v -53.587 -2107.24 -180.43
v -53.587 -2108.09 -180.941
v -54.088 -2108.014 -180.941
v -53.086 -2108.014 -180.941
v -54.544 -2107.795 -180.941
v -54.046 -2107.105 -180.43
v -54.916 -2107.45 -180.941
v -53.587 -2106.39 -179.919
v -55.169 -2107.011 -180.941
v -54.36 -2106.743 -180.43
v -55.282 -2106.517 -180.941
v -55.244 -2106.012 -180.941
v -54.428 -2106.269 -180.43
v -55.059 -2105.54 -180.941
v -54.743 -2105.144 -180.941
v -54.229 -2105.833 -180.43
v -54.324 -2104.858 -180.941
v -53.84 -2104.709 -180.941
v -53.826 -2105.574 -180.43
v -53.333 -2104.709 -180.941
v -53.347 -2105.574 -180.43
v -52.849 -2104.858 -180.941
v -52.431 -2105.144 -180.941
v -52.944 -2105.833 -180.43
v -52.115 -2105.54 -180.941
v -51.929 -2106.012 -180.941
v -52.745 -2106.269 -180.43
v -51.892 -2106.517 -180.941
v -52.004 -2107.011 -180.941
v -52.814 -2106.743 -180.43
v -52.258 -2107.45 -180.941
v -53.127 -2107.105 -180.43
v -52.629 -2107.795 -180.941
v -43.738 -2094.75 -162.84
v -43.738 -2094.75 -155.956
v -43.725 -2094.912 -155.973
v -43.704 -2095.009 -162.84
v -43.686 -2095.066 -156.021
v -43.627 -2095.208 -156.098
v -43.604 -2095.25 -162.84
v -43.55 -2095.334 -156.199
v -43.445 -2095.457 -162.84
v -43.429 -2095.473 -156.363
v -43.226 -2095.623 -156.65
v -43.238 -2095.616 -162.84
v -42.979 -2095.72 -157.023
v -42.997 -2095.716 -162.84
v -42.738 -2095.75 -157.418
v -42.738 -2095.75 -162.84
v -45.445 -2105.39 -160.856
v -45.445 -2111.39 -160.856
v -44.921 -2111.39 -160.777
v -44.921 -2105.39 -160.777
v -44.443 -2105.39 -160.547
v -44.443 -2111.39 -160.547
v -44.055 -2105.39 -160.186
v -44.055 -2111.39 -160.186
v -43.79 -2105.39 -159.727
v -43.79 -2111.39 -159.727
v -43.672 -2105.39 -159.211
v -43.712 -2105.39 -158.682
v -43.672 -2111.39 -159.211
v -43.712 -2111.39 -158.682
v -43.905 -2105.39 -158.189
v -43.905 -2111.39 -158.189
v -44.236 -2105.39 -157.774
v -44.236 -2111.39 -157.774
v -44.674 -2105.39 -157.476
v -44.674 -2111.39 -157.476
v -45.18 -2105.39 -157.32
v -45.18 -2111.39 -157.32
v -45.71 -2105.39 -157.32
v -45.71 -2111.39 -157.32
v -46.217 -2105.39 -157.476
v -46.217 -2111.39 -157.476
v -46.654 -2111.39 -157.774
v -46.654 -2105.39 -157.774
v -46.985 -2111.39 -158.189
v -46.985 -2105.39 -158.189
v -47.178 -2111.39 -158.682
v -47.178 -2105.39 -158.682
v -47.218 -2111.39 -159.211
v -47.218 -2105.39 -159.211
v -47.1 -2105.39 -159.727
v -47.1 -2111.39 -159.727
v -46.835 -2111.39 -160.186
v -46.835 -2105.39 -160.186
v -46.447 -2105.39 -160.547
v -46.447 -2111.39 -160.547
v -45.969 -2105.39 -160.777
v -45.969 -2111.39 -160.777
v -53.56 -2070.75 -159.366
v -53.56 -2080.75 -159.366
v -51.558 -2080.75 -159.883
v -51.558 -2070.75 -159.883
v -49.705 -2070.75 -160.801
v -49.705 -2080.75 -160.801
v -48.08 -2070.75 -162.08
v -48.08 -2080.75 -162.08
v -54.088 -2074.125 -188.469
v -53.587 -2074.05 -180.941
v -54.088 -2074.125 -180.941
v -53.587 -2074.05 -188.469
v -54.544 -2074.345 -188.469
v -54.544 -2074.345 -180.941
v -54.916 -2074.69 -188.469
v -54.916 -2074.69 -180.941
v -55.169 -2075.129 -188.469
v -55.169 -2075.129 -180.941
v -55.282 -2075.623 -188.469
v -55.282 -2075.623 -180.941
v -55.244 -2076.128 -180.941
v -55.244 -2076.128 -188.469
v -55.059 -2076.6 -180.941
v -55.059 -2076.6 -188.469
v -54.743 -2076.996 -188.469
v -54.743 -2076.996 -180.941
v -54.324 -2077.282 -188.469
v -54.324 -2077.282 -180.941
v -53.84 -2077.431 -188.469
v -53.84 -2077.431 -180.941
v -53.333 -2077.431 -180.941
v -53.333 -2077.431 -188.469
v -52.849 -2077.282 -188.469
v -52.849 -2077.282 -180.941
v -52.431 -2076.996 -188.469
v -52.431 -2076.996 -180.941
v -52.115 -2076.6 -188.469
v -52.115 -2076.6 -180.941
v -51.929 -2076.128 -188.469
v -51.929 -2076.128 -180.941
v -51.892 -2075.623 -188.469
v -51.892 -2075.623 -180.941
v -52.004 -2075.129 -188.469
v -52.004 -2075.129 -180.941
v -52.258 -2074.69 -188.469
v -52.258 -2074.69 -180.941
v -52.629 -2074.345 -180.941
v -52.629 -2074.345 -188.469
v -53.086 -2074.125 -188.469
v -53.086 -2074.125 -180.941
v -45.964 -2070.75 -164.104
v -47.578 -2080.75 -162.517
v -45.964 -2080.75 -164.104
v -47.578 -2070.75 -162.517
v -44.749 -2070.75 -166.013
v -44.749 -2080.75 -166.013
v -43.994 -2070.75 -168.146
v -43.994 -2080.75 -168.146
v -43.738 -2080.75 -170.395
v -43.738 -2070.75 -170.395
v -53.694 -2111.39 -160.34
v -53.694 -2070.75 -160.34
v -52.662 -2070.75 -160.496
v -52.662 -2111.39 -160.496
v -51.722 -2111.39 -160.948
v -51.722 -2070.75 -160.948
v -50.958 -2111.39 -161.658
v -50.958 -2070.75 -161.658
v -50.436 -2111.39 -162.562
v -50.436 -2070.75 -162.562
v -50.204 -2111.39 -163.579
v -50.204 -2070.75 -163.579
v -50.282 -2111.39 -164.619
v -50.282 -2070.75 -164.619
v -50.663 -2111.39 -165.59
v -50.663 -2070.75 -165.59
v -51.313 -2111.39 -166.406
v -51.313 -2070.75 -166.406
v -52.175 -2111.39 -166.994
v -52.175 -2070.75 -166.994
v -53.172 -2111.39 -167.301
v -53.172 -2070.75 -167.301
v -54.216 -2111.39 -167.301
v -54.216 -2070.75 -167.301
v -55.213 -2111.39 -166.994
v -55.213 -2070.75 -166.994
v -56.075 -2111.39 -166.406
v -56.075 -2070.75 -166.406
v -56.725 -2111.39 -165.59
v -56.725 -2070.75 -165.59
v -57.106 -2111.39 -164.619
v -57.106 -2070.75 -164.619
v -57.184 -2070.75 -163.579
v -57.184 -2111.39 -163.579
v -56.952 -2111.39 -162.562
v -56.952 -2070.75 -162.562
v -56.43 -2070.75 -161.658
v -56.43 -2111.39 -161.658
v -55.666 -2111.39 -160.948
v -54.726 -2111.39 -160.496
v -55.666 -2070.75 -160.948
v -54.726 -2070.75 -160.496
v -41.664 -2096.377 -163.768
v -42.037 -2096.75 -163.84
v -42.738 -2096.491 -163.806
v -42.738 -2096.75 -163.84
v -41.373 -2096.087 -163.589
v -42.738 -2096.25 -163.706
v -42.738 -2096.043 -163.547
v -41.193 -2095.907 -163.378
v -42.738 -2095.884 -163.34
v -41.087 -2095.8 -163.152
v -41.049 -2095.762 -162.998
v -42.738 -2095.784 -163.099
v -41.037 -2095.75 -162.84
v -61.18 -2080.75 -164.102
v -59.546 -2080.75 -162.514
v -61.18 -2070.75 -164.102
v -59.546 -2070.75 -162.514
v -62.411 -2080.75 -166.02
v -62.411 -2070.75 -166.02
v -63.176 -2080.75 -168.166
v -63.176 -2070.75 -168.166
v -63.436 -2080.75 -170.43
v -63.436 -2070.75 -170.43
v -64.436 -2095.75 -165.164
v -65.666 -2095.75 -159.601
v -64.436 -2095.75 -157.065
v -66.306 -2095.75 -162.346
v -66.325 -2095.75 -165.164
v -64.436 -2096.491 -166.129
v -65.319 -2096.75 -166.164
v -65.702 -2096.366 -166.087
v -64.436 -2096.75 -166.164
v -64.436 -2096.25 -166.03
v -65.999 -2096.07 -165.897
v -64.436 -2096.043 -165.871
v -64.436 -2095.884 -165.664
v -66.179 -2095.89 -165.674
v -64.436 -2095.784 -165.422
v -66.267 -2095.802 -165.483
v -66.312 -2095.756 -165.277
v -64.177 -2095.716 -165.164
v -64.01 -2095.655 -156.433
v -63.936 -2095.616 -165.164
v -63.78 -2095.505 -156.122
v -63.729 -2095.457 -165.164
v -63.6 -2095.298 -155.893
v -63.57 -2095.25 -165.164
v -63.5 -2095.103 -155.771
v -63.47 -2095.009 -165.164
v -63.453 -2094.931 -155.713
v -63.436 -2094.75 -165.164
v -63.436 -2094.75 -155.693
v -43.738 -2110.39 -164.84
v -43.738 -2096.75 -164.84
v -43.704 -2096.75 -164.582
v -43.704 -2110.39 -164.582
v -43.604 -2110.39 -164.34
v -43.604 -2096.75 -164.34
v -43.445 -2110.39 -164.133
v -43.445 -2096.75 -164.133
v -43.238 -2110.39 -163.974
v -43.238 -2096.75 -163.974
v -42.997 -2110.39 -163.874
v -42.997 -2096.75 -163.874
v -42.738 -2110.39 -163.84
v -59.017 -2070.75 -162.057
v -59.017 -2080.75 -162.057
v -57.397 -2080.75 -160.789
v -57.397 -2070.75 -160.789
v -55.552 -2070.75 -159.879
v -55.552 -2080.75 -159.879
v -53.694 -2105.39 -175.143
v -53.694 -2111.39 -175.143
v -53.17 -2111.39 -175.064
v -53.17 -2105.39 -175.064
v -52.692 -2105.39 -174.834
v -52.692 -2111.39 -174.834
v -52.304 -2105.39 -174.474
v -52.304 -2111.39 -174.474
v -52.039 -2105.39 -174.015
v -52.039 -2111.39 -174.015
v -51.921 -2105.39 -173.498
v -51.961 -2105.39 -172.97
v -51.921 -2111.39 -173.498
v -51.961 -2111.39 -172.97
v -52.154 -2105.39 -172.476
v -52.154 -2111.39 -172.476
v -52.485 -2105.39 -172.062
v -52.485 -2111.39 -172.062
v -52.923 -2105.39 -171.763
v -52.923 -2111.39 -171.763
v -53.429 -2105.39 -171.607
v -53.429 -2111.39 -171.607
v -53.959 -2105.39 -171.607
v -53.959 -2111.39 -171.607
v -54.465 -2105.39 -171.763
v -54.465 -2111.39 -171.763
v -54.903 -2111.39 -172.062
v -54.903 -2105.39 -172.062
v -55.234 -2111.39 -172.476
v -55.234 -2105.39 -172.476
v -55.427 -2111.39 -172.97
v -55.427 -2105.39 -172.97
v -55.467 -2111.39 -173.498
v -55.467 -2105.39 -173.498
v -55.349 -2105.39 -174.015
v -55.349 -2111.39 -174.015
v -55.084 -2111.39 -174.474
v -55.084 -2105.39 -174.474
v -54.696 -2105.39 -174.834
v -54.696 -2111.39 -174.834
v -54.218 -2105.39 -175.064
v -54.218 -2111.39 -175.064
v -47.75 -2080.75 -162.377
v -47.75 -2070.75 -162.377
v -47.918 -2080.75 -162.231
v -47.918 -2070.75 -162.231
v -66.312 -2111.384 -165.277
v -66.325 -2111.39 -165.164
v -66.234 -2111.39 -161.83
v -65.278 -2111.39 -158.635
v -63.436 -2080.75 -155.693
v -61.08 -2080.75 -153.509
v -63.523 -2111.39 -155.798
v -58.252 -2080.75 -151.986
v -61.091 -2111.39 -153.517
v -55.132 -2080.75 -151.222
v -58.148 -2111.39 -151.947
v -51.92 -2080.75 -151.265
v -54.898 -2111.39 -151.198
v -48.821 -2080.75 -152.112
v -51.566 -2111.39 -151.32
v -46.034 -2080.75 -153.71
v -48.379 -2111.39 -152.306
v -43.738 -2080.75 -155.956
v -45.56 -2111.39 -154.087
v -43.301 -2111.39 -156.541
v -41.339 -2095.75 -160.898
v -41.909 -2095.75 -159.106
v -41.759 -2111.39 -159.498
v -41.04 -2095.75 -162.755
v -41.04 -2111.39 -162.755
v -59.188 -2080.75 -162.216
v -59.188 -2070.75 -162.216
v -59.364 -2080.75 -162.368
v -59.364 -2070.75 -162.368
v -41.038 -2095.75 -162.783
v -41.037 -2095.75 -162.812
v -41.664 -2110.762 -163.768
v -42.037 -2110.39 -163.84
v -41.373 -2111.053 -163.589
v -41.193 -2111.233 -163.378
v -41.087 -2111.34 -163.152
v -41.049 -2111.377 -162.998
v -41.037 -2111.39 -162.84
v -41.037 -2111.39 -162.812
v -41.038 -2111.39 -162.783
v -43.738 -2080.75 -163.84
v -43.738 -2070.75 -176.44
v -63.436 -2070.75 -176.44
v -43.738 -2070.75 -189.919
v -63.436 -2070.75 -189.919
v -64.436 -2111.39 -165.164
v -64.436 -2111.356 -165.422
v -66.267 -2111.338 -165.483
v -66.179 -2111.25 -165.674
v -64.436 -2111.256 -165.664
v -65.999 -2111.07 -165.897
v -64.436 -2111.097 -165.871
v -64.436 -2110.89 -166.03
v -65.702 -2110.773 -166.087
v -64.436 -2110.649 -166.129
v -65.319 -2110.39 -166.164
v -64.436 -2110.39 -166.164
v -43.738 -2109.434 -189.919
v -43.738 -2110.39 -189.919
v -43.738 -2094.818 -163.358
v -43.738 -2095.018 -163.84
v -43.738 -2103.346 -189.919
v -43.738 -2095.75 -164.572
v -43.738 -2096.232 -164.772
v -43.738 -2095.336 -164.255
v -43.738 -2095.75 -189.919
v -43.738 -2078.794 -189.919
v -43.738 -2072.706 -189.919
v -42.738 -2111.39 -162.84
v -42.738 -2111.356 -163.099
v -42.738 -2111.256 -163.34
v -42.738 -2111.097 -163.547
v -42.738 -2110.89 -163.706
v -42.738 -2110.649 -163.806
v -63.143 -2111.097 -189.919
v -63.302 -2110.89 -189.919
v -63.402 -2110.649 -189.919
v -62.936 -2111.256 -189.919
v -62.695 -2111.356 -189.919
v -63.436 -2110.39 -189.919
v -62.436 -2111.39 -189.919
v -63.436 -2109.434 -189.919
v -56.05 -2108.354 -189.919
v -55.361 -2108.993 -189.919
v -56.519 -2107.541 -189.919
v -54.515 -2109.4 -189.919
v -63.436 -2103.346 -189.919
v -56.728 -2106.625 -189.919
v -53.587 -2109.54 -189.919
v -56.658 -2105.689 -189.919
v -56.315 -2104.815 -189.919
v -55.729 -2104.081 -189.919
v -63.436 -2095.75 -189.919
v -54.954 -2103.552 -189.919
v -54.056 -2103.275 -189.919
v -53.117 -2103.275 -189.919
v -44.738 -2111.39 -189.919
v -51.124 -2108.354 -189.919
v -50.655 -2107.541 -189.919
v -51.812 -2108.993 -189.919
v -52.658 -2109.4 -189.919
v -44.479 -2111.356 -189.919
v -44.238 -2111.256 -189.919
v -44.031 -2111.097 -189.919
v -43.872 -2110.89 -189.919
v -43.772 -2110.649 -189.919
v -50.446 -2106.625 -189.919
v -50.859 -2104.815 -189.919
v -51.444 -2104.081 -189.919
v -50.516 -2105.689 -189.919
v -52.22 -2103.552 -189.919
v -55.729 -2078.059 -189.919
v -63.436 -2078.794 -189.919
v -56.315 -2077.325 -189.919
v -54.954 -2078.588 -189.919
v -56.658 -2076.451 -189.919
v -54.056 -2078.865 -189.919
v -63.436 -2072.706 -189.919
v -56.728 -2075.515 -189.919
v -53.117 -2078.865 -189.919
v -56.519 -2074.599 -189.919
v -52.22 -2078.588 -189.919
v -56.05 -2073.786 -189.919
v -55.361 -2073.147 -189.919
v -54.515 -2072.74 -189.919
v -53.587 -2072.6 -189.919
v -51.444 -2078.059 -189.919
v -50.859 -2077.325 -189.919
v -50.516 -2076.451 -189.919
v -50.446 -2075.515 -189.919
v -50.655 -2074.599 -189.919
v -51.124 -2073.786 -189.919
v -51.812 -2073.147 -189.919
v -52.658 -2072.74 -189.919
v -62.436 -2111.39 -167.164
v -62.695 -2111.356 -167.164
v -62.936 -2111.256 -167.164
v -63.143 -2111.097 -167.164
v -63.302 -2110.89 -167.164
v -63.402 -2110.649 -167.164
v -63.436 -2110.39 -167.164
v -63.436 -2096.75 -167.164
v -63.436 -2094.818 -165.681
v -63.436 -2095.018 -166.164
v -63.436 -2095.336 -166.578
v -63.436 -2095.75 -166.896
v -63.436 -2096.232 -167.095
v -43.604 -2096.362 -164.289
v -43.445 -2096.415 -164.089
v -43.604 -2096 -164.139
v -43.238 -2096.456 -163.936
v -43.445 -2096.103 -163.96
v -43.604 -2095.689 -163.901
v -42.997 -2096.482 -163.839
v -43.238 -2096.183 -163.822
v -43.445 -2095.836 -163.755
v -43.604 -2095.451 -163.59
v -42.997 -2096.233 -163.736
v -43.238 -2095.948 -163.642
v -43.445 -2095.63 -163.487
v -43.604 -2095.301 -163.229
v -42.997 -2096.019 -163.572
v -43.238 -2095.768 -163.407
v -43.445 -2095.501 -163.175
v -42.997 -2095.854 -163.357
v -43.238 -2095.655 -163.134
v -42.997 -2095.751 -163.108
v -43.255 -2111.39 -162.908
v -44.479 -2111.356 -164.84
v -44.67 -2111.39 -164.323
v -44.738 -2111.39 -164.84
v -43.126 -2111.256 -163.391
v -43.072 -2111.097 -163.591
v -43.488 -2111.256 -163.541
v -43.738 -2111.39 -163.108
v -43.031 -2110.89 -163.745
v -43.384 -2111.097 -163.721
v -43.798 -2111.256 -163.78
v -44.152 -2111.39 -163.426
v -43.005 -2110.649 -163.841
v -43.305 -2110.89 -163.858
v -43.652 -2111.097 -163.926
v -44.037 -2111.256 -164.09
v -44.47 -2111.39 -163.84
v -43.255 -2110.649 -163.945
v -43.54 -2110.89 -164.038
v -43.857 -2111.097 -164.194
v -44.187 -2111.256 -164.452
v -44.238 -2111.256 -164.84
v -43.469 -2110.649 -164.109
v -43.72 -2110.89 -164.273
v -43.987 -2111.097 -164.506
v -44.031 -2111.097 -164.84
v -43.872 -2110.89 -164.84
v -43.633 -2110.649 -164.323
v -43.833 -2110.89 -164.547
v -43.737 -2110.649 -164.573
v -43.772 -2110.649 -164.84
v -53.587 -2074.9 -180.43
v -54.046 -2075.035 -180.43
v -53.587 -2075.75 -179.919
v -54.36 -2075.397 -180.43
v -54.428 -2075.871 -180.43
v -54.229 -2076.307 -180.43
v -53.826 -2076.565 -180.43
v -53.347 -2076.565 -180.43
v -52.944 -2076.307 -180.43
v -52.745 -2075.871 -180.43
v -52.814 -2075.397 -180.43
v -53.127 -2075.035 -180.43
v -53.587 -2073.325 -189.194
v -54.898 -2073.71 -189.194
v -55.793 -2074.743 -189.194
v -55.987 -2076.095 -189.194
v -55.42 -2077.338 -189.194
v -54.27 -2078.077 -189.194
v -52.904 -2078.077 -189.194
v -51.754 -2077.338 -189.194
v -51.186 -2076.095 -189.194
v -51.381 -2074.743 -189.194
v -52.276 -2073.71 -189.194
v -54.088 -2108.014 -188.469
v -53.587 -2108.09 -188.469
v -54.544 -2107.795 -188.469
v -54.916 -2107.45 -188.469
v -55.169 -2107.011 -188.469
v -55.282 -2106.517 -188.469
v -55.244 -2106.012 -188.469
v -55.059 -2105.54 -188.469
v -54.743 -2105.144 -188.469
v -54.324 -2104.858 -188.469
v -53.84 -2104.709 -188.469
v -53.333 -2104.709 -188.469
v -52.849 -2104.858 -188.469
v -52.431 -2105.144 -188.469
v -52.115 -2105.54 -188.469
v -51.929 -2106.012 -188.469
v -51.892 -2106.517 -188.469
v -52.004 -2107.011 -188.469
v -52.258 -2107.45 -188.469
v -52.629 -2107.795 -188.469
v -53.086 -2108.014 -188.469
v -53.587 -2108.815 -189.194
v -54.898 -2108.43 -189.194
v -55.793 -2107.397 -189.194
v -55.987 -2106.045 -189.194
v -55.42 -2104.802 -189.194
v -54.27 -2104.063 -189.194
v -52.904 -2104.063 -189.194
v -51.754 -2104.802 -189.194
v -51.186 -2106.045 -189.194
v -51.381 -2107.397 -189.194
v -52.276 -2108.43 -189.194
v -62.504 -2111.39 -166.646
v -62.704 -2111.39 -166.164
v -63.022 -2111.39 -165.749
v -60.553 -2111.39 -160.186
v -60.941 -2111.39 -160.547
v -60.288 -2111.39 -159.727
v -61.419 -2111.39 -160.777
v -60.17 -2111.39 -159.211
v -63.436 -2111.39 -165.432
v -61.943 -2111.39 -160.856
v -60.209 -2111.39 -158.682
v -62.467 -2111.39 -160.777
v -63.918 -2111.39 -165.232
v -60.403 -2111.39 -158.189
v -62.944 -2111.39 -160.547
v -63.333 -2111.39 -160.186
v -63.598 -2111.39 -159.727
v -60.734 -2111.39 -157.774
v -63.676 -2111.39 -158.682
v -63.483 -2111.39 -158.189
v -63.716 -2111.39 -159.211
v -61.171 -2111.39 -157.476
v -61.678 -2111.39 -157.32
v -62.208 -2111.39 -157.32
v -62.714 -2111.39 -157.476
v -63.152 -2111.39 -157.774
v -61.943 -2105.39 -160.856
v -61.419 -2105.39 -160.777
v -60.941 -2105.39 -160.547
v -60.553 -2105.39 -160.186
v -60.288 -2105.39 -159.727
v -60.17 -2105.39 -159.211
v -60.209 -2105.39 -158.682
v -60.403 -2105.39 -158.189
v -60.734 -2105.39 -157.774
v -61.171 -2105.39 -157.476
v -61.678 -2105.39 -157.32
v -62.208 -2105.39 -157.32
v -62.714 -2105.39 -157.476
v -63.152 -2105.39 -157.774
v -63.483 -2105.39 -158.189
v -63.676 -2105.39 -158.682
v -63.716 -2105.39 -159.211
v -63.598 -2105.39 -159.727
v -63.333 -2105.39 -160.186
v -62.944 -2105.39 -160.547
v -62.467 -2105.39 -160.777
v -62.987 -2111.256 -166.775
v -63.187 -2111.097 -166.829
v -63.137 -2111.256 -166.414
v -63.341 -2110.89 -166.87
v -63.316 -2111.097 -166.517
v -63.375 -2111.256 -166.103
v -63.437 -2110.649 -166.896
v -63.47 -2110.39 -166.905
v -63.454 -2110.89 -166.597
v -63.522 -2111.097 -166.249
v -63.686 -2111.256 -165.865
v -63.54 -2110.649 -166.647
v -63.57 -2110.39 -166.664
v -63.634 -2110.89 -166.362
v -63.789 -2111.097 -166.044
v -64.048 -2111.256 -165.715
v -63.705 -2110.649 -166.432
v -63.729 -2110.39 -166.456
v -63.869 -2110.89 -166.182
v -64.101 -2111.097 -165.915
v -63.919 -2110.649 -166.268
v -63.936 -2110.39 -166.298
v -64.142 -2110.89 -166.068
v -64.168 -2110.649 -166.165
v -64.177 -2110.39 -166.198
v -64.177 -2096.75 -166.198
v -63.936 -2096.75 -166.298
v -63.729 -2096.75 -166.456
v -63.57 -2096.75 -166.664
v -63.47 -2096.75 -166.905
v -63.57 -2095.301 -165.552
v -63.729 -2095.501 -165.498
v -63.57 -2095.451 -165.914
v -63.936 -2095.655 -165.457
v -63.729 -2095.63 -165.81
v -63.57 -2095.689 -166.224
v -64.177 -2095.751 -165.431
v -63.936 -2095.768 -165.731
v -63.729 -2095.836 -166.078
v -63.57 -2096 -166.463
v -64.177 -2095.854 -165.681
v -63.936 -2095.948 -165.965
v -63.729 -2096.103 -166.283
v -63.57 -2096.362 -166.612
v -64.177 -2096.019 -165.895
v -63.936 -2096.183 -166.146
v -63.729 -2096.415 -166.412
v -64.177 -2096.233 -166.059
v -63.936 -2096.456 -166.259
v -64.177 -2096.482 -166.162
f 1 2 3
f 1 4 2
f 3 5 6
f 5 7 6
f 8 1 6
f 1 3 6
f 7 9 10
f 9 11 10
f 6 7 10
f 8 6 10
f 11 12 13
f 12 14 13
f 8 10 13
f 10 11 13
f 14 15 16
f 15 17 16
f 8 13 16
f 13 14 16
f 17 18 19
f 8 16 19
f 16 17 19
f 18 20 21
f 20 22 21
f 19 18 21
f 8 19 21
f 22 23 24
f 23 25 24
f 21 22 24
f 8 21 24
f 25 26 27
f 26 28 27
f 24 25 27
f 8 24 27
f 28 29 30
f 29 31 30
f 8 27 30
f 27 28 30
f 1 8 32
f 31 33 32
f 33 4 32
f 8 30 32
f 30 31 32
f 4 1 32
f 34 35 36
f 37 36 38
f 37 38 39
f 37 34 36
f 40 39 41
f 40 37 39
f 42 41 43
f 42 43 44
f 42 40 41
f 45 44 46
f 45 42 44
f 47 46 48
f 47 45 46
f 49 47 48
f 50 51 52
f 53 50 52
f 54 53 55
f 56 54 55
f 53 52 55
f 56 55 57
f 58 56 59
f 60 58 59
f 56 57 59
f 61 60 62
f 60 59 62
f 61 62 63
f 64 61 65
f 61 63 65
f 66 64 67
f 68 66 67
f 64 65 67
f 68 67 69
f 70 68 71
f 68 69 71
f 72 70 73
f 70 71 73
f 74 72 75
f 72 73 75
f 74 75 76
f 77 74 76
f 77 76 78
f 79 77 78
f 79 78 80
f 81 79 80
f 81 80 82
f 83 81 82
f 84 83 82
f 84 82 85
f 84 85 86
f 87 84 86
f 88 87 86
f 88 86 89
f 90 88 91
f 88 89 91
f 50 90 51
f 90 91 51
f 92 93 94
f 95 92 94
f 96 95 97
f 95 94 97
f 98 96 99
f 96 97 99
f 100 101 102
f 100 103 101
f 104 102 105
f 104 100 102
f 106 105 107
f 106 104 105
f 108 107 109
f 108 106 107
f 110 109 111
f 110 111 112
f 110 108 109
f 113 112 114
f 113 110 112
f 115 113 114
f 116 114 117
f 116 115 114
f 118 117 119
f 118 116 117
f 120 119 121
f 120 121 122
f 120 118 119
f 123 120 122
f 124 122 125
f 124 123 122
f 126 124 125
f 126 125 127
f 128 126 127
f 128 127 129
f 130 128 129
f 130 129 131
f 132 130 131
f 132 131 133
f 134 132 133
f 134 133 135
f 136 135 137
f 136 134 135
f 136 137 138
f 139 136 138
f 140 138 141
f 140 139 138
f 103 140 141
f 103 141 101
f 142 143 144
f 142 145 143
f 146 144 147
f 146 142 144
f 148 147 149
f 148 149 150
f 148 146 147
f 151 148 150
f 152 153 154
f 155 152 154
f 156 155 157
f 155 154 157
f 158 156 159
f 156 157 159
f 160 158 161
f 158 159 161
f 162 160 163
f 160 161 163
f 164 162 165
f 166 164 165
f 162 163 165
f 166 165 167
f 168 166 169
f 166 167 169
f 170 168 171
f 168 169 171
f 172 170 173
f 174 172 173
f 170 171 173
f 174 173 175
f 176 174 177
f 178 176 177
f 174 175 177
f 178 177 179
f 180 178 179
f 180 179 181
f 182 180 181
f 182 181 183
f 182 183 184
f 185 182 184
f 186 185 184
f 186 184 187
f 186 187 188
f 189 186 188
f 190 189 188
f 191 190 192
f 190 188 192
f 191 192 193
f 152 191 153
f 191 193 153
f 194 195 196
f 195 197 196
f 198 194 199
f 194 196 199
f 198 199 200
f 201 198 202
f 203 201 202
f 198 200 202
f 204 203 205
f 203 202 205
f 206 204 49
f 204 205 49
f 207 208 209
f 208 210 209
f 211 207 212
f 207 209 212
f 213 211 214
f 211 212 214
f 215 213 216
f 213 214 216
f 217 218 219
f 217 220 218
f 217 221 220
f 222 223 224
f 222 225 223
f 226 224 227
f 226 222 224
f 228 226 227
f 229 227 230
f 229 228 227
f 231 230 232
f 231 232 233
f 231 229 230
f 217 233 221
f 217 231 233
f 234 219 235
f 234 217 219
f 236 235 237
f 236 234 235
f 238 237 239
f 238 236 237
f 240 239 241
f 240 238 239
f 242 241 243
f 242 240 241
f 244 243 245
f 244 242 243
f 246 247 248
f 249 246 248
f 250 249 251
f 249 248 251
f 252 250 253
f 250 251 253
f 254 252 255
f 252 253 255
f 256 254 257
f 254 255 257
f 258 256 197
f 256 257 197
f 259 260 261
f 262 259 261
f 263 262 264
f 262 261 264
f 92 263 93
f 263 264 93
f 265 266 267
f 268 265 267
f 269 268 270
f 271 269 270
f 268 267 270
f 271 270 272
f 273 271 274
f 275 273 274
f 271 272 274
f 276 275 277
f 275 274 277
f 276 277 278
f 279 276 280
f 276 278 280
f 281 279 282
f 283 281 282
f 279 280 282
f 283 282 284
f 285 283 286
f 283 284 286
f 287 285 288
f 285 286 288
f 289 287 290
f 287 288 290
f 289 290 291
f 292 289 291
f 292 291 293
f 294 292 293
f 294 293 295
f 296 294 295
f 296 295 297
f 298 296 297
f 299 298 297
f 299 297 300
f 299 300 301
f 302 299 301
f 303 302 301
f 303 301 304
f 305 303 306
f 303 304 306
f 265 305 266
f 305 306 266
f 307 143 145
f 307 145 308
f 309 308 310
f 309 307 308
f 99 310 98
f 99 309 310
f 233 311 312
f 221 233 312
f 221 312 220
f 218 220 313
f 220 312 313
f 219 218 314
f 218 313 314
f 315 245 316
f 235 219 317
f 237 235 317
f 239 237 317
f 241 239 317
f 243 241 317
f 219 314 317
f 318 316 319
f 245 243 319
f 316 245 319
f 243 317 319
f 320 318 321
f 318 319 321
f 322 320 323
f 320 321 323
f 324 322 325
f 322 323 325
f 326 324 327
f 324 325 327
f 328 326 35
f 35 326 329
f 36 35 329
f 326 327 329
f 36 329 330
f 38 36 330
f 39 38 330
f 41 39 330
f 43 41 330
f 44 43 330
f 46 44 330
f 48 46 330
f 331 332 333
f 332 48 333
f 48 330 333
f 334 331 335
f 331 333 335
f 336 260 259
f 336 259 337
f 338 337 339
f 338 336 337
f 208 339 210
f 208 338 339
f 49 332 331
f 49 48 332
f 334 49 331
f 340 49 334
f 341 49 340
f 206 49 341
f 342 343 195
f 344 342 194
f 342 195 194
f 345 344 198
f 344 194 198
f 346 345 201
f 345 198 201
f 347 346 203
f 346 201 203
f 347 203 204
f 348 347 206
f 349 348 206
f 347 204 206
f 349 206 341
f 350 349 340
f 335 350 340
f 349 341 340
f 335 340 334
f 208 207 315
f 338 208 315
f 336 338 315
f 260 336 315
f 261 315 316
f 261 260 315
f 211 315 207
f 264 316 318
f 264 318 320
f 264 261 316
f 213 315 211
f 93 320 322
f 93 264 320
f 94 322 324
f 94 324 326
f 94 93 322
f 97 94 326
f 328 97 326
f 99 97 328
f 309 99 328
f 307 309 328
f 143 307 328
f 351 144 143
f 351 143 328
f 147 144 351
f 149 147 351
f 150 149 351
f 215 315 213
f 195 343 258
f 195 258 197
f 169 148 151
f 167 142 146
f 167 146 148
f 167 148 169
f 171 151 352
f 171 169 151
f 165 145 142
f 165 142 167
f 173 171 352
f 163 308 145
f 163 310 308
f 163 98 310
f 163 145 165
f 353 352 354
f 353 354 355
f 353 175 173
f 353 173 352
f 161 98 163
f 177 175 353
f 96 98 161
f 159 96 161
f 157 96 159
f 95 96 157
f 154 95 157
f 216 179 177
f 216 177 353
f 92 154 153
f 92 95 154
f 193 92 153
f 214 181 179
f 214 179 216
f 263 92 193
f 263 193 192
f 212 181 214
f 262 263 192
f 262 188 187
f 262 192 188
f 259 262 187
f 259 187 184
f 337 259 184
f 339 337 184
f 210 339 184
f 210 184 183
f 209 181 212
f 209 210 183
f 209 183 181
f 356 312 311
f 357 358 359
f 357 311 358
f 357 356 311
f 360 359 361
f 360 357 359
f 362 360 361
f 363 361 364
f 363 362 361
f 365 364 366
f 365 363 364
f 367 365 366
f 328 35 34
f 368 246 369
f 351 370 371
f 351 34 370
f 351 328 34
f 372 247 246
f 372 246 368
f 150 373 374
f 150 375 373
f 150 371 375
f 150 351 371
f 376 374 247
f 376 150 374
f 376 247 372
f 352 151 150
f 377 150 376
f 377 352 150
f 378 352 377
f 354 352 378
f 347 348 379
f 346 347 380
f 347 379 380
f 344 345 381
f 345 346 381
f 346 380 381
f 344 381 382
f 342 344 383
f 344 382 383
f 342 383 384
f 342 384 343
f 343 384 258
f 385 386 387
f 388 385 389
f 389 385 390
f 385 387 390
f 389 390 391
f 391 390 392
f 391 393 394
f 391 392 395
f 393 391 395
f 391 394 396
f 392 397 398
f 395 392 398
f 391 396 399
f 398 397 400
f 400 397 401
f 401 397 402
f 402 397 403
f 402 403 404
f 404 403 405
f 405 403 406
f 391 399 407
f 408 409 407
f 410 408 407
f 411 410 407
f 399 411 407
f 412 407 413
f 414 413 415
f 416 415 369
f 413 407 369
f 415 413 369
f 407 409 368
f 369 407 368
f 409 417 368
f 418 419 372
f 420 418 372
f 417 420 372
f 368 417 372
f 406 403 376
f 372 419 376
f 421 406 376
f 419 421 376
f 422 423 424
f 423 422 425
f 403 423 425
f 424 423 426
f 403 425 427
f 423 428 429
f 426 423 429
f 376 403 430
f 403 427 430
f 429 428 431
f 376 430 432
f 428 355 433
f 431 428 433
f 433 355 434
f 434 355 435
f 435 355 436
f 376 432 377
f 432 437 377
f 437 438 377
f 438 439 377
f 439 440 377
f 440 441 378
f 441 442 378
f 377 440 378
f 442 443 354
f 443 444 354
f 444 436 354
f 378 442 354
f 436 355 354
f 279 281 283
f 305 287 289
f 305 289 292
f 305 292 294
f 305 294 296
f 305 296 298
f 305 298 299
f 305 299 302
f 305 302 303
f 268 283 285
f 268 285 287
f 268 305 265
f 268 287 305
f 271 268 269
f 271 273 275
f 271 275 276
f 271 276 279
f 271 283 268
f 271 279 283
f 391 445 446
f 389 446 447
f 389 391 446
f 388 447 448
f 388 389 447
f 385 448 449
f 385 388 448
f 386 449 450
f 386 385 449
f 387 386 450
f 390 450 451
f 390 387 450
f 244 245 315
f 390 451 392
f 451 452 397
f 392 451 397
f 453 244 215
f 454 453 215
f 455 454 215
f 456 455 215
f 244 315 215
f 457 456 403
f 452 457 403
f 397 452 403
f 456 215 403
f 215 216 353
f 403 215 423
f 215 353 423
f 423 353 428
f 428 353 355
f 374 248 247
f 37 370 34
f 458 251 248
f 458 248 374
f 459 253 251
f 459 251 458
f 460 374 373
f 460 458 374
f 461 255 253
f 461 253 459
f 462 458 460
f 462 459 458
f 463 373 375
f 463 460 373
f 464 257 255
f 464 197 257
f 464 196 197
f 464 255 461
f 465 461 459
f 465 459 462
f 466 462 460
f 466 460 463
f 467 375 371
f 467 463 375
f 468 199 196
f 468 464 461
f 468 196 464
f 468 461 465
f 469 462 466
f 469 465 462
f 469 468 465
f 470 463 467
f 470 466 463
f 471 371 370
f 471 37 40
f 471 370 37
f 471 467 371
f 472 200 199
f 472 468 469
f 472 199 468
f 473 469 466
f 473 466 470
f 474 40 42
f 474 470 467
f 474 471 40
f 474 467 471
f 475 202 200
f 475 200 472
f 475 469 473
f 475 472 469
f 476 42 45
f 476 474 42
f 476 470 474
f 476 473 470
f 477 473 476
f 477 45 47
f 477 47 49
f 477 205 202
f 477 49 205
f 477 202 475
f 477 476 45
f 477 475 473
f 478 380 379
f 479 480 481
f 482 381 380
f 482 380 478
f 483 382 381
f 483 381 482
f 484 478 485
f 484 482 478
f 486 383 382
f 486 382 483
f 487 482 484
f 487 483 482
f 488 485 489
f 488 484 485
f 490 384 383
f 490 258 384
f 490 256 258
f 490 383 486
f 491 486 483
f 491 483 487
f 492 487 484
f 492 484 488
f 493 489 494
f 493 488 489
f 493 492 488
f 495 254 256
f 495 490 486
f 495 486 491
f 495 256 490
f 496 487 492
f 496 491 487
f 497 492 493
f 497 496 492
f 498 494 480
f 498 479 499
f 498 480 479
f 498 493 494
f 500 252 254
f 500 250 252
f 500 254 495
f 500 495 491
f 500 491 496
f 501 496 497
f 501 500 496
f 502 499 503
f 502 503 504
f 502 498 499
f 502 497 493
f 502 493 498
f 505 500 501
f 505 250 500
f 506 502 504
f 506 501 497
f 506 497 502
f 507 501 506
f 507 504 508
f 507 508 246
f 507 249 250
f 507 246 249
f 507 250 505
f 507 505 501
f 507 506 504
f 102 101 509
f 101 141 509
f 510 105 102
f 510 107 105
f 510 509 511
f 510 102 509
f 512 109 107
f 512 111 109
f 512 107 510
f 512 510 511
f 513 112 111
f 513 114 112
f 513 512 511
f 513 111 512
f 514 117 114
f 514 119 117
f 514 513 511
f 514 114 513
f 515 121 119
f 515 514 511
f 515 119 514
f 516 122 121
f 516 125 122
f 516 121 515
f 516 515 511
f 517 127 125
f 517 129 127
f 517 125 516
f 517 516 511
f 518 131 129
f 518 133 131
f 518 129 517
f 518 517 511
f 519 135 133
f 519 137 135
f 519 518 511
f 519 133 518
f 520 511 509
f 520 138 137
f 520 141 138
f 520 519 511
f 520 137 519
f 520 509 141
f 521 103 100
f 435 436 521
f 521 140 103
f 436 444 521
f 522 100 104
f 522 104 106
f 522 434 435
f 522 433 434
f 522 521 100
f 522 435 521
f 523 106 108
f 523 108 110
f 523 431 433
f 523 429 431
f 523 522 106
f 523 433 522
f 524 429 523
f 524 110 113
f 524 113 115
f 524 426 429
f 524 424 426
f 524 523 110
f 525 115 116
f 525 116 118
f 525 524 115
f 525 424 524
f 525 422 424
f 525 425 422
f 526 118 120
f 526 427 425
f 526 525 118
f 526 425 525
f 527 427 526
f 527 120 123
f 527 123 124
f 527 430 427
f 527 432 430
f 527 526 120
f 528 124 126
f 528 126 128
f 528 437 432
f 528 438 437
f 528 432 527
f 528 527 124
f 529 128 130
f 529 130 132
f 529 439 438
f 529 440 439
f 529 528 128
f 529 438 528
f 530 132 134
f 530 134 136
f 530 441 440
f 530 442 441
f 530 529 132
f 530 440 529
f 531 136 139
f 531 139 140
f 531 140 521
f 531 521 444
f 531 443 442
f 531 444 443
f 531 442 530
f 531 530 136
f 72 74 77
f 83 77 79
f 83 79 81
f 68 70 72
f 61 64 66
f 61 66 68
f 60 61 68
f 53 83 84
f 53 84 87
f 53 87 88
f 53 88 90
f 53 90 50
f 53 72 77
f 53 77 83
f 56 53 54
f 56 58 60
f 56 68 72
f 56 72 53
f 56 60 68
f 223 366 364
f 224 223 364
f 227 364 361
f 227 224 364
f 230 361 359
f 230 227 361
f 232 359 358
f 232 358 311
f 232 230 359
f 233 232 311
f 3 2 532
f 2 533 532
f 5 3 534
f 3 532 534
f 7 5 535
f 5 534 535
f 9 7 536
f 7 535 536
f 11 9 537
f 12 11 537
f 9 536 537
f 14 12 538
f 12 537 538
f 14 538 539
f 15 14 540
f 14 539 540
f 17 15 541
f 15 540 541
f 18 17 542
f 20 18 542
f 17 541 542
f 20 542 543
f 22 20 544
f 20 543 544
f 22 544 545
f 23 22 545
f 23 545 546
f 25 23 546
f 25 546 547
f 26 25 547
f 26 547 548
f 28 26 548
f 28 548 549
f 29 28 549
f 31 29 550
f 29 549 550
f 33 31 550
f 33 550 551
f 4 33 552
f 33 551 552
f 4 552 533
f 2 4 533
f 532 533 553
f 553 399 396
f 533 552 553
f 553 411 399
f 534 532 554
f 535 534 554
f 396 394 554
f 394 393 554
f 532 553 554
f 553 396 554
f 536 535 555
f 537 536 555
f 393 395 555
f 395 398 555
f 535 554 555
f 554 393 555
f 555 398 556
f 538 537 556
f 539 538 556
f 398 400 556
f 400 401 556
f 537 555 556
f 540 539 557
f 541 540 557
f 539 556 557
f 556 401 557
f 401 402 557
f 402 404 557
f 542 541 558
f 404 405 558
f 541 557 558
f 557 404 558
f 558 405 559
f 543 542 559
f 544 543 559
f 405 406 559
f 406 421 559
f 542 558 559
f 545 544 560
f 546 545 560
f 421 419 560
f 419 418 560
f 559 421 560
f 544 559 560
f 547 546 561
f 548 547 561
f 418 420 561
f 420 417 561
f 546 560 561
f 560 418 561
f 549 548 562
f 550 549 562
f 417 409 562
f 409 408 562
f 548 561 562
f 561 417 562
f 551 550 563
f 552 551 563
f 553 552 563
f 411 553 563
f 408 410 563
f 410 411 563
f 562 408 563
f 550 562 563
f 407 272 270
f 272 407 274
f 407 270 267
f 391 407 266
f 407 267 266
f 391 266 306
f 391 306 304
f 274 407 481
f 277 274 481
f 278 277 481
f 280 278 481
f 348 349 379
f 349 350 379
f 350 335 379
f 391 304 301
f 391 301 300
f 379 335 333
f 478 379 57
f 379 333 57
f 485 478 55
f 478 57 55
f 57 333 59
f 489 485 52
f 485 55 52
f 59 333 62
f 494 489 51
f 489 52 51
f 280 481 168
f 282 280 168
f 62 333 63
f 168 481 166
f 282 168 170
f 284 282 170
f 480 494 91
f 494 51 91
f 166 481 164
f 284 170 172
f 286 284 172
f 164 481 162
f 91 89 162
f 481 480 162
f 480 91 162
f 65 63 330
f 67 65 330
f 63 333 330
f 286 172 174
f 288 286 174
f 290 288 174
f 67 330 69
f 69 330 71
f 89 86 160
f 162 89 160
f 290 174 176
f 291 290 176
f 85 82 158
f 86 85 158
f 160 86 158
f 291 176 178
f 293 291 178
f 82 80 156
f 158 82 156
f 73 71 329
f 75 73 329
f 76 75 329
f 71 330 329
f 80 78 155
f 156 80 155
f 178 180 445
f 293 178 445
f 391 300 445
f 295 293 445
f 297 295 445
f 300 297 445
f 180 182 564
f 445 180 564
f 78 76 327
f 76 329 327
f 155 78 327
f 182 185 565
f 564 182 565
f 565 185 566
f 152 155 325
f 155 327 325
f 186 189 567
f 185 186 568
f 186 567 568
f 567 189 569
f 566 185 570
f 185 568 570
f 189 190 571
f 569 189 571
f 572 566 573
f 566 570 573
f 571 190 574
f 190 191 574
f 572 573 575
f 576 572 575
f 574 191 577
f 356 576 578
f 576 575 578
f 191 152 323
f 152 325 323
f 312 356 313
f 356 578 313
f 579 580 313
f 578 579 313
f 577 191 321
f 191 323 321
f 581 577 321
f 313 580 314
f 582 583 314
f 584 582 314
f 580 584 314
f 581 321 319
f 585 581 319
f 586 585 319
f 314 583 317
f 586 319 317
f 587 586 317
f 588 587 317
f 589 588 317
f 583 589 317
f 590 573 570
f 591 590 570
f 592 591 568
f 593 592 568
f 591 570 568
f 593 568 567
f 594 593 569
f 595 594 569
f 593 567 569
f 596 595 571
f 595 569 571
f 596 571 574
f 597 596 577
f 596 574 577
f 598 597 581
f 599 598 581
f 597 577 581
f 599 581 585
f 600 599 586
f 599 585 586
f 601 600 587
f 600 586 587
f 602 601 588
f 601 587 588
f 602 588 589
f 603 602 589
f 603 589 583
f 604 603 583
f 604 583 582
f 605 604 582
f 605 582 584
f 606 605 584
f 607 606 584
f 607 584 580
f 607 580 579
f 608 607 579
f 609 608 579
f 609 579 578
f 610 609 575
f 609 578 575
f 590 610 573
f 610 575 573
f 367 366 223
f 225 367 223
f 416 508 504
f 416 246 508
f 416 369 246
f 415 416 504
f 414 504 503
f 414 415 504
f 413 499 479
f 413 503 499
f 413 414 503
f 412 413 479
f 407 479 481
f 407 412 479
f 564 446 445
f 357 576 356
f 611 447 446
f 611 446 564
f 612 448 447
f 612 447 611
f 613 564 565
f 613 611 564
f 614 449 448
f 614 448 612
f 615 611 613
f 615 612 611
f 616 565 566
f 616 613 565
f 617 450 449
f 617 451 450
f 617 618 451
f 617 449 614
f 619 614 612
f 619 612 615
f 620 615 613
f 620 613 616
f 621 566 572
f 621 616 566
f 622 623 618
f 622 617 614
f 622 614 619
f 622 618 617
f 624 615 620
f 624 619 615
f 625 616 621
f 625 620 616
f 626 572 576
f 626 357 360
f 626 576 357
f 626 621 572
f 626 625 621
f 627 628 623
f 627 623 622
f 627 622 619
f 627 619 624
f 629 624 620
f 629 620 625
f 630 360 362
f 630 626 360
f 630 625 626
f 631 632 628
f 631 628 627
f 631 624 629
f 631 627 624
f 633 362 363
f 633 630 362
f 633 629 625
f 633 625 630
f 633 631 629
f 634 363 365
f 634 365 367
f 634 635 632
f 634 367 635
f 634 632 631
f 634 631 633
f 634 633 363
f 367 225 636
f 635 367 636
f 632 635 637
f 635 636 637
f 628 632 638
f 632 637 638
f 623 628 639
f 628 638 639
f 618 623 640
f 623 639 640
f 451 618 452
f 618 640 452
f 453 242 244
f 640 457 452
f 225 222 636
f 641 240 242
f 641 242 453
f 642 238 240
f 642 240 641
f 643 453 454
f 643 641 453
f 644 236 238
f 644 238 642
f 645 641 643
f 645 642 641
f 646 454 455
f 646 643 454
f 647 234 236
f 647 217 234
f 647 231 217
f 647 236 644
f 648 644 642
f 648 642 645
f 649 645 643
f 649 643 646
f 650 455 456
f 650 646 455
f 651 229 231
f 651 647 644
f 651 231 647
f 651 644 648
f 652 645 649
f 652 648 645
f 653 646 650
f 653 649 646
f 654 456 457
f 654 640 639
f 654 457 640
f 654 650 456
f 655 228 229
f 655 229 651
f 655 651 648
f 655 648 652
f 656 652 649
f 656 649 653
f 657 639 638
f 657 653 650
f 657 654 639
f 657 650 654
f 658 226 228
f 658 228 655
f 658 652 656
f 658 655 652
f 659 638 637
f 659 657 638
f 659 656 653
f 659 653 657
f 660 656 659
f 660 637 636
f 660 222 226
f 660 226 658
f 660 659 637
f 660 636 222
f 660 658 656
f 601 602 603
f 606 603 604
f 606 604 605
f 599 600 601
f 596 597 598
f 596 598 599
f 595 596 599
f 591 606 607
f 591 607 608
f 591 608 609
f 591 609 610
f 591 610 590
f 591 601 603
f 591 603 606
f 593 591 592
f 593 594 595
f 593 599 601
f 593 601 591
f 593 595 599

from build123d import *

# Parameters (mm, degrees)
SKETCH2_R                                      = 12.7
BOSS_EXTRUDE6_DEPTH                            = 40.64
SKETCH3_R                                      = 3.5
CUT_EXTRUDE1_DEPTH                             = 40.64
SKETCH4_R                                      = 1.778
CUT_EXTRUDE2_DEPTH                             = 6
BOSS_EXTRUDE8_DEPTH                            = 10
SKETCH8_W                                      = 25.185693912
SKETCH8_H                                      = 10
BOSS_EXTRUDE9_DEPTH                            = 7.284789049
BOSS_EXTRUDE10_DEPTH                           = 30.64
CSK_FOR_M3_FLAT_HEAD_MACHINE_SCREW1_AT_2_COUNT = 2
CSK_FOR_M3_FLAT_HEAD_MACHINE_SCREW1_AT_2_PITCH = 9.039543014
CSK_FOR_M3_FLAT_HEAD_MACHINE_SCREW1_AT_3_COUNT = 2
CSK_FOR_M3_FLAT_HEAD_MACHINE_SCREW1_AT_3_PITCH = 9.039543014
SKETCH16_W                                     = 3.769994858
SKETCH16_H                                     = 22.000968128
CUT_EXTRUDE3_DEPTH                             = 25
SKETCH17_W                                     = 10.276759259
SKETCH17_H                                     = 15.64
CUT_EXTRUDE4_DEPTH                             = 2.743753899
SKETCH18_W                                     = 12.6
SKETCH18_H                                     = 15.64
CUT_EXTRUDE5_DEPTH                             = 2.743753899
SKETCH20_W                                     = 2.743753899
SKETCH20_H                                     = 13.478747573
CUT_EXTRUDE7_DEPTH                             = 25
SKETCH21_W                                     = 5.741451758
SKETCH21_H                                     = 11.696500392
SKETCH21_W_2                                   = 5.938790765
BOSS_EXTRUDE12_DEPTH                           = 15
CUT_EXTRUDE8_START                             = -10
CUT_EXTRUDE8_DEPTH                             = 10
FILLET1_R                                      = 10
FILLET5_R                                      = 10
SKETCH23_W                                     = 2.743753899
SKETCH23_H                                     = 13.478747573
CUT_EXTRUDE9_DEPTH                             = 20
SKETCH24_W                                     = 5.557541457
SKETCH24_H                                     = 9.320824694
SKETCH24_W_2                                   = 5.259690838
BOSS_EXTRUDE13_DEPTH                           = 20
FILLET6_R                                      = 1


with BuildPart() as part:
    # Sketch2 → Boss-Extrude6 (new body)
    with BuildSketch(Plane(origin=(0, -2111.389926236, 0), x_dir=(1, 0, 0), z_dir=(0, 1, 0))):
        with Locations(Location((-53.693967541, 163.840329354, 0), (0, 0, 180))):
            Circle(SKETCH2_R)
    extrude(amount=BOSS_EXTRUDE6_DEPTH)

    # Sketch3 → Cut-Extrude1 (cut)
    with BuildSketch(Plane(origin=(0, -2070.749926236, 0), x_dir=(1, 0, 0), z_dir=(0, 1, 0))):
        with Locations(Location((-53.693967541, 163.840329354, 0), (0, 0, 270))):
            Circle(SKETCH3_R)
    extrude(amount=-CUT_EXTRUDE1_DEPTH, mode=Mode.SUBTRACT)

    # Sketch4 → Cut-Extrude2 (cut)
    with BuildSketch(Plane.XZ.offset(2111.389926236)):
        with Locations(Location((-61.942859512, -159.077829354, 0), (0, 0, 270))):
            Circle(SKETCH4_R)
        with Locations(Location((-53.693967541, -173.365329354, 0), (0, 0, 270))):
            Circle(SKETCH4_R)
        with Locations(Location((-45.44507557, -159.077829354, 0), (0, 0, 270))):
            Circle(SKETCH4_R)
    extrude(amount=-CUT_EXTRUDE2_DEPTH, mode=Mode.SUBTRACT)

    # Sketch7 → Boss-Extrude8 (add)
    with BuildSketch(Plane.XZ.offset(2111.389926236)):
        with BuildLine():
            Line((-40.993967541, -163.840329354), (-40.993967541, -182.634287878))
            Line((-40.993967541, -182.634287878), (-66.179661453, -182.634287878))
            Line((-66.179661453, -182.634287878), (-66.179661453, -166.163570095))
            ThreePointArc((-66.179661453, -166.163570095), (-52.527415502, -176.486639343), (-40.993967541, -163.840329354))
        make_face()
    extrude(amount=-BOSS_EXTRUDE8_DEPTH)

    # Sketch8 → Boss-Extrude9 (add)
    with BuildSketch(Plane(origin=(0, 0, -182.634287878), x_dir=(-1, 0, 0), z_dir=(0, 0, -1))):
        with Locations((53.586814497, -2106.389926236)):
            Rectangle(SKETCH8_W, SKETCH8_H)
    extrude(amount=BOSS_EXTRUDE9_DEPTH)

    # Sketch9 → Boss-Extrude10 (add)
    with BuildSketch(Plane(origin=(0, -2070.749926236, 0), x_dir=(1, 0, 0), z_dir=(0, 1, 0))):
        with BuildLine():
            Line((-66.179661453, 163.840329354), (-66.179661453, 189.919076927))
            Line((-66.179661453, 189.919076927), (-40.993967541, 189.919076927))
            Line((-40.993967541, 189.919076927), (-40.993967541, 163.840329354))
            ThreePointArc((-40.993967541, 163.840329354), (-53.586814497, 176.43317631), (-66.179661453, 163.840329354))
        make_face()
    extrude(amount=-BOSS_EXTRUDE10_DEPTH)

    # Sketch15 → CSK for M3 Flat Head Machine Screw1 (revolve, cut)
    with BuildSketch(Plane(origin=(-53.586814498, -2075.749926236, -189.919076927), x_dir=(0, 1, 0), z_dir=(1, 0, 0))):
        Polygon((0, 0), (0, 10), (1.7, 8.978536948), (1.7, 1.45), (3.15, 0), align=None)
    csk_for_m3_flat_head_machine_screw1 = revolve(axis=Axis((-53.586814498, -2075.749926236, -196.269076927), (0, 0, 1)), mode=Mode.SUBTRACT)

    # CSK for M3 Flat Head Machine Screw1 at 2: CSK for M3 Flat Head Machine Screw1 ×2
    with Locations(*[(-i * CSK_FOR_M3_FLAT_HEAD_MACHINE_SCREW1_AT_2_PITCH, 0, 0) for i in range(1, CSK_FOR_M3_FLAT_HEAD_MACHINE_SCREW1_AT_2_COUNT)]):
        add(csk_for_m3_flat_head_machine_screw1, mode=Mode.SUBTRACT)

    # CSK for M3 Flat Head Machine Screw1 at 3: CSK for M3 Flat Head Machine Screw1 ×2
    with Locations(*[(i * CSK_FOR_M3_FLAT_HEAD_MACHINE_SCREW1_AT_3_PITCH, 0, 0) for i in range(1, CSK_FOR_M3_FLAT_HEAD_MACHINE_SCREW1_AT_3_COUNT)]):
        add(csk_for_m3_flat_head_machine_screw1, mode=Mode.SUBTRACT)

    # Mirror1: CSK for M3 Flat Head Machine Screw1 across plane
    add(csk_for_m3_flat_head_machine_screw1.mirror(Plane.ZX.offset(-2091.069926234)), mode=Mode.SUBTRACT)

    # Mirror1 copy 1 sketch → Mirror1 copy 1 (revolve, cut)
    with BuildSketch(Plane(origin=(-62.626357512, -2106.389926232, -189.919076927), x_dir=(0, -1, 0), z_dir=(1, 0, 0))):
        Polygon((0, 0), (0, -10), (1.7, -8.978536948), (1.7, -1.45), (3.15, 0), align=None)
    revolve(axis=Axis((-62.626357512, -2106.389926232, -196.269076927), (0, 0, -1)), mode=Mode.SUBTRACT)

    # Mirror1 copy 2 sketch → Mirror1 copy 2 (revolve, cut)
    with BuildSketch(Plane(origin=(-44.547271484, -2106.389926232, -189.919076927), x_dir=(0, -1, 0), z_dir=(1, 0, 0))):
        Polygon((0, 0), (0, -10), (1.7, -8.978536948), (1.7, -1.45), (3.15, 0), align=None)
    revolve(axis=Axis((-44.547271484, -2106.389926232, -196.269076927), (0, 0, -1)), mode=Mode.SUBTRACT)

    # Sketch16 → Cut-Extrude3 (cut)
    with BuildSketch(Plane(origin=(0, -2070.749926236, 0), x_dir=(1, 0, 0), z_dir=(0, 1, 0))):
        with Locations((-65.320904983, 165.43984529)):
            Rectangle(SKETCH16_W, SKETCH16_H)
        with Locations((-41.852724011, 165.43984529)):
            Rectangle(SKETCH16_W, SKETCH16_H)
    extrude(amount=-CUT_EXTRUDE3_DEPTH, mode=Mode.SUBTRACT)

    # Sketch17 → Cut-Extrude4 (cut)
    with BuildSketch(Plane.ZY.offset(66.179661453)):
        with Locations((-171.301949724, -2103.569926236)):
            Rectangle(SKETCH17_W, SKETCH17_H)
    extrude(amount=-CUT_EXTRUDE4_DEPTH, mode=Mode.SUBTRACT)

    # Sketch18 → Cut-Extrude5 (cut)
    with BuildSketch(Plane(origin=(-40.993967541, 0, 0), x_dir=(0, 0, -1), z_dir=(1, 0, 0))):
        with Locations((170.140329354, -2103.569926236)):
            Rectangle(SKETCH18_W, SKETCH18_H)
    extrude(amount=-CUT_EXTRUDE5_DEPTH, mode=Mode.SUBTRACT)

    # Sketch20 → Cut-Extrude7 (cut)
    with BuildSketch(Plane(origin=(0, -2070.749926236, 0), x_dir=(1, 0, 0), z_dir=(0, 1, 0))):
        with Locations((-42.365844491, 183.179703141)):
            Rectangle(SKETCH20_W, SKETCH20_H)
        with Locations((-64.807784504, 183.179703141)):
            Rectangle(SKETCH20_W, SKETCH20_H)
    extrude(amount=-CUT_EXTRUDE7_DEPTH, mode=Mode.SUBTRACT)

    # Sketch21 → Boss-Extrude12 (add)
    with BuildSketch(Plane(origin=(0, 0, -189.919076927), x_dir=(-1, 0, 0), z_dir=(0, 0, -1))):
        with Locations((46.608447319, -2076.598176432)):
            Rectangle(SKETCH21_W, SKETCH21_H)
        with Locations((60.466512171, -2076.598176432)):
            Rectangle(SKETCH21_W_2, SKETCH21_H)
    extrude(amount=-BOSS_EXTRUDE12_DEPTH)

    # Sketch22 → Cut-Extrude8 (cut)
    with BuildSketch(Plane(origin=(0, -2070.749926236, 0), x_dir=(1, 0, 0), z_dir=(0, 1, 0)).offset(CUT_EXTRUDE8_START)):
        with BuildLine():
            Line((-49.74995705, 159.255687351), (-53.693967541, 159.255687351))
            Line((-53.693967541, 159.255687351), (-57.324101589, 159.255687351))
            ThreePointArc((-57.324101589, 159.255687351), (-59.615792554, 162.566782678), (-63.435907554, 163.840329354))
            Line((-63.435907554, 163.840329354), (-63.435907554, 159.255687351))
            Line((-63.435907554, 159.255687351), (-63.435907554, 155.692654546))
            ThreePointArc((-63.435907554, 155.692654546), (-53.52421717, 151.141463861), (-43.73772144, 155.95596739))
            Line((-43.73772144, 155.95596739), (-43.73772144, 159.255687351))
            Line((-43.73772144, 159.255687351), (-43.73772144, 163.840329354))
            ThreePointArc((-43.73772144, 163.840329354), (-47.518128803, 162.563400885), (-49.74995705, 159.255687351))
        make_face()
    extrude(amount=CUT_EXTRUDE8_DEPTH, mode=Mode.SUBTRACT)

    # Fillet1
    # the kernel refuses this fillet: 10 mm, written as the material it takes off along each edge
    with BuildSketch(Plane(origin=(-49.74995705, -2080.749926236, -159.255687351), x_dir=(-1, 0, 0), z_dir=(0, 1, 0))) as fillet1_piece_1:
        with BuildLine():
            CenterArc((5.294391522, -10), FILLET1_R, 90, 44.143408643)
            ThreePointArc((-1.670175142, -2.824011483), (-0.645987197, -1.523843369), (0, 0))
            Line((0, 0), (5.294391522, 0))
        make_face()
    extrude(amount=23.235978804, mode=Mode.SUBTRACT)
    with BuildSketch(Plane(origin=(-57.324101589, -2080.749926236, -159.255687351), x_dir=(1, 0, 0), z_dir=(0, 1, 0))) as fillet1_piece_2:
        with BuildLine():
            CenterArc((5.248080135, 10), FILLET1_R, 226.043798631, 43.956201369)
            ThreePointArc((-1.693002689, 2.80129392), (-0.663389254, 1.511313412), (0, 0))
            Line((0, 0), (5.248080135, 0))
        make_face()
    extrude(amount=23.120200338, mode=Mode.SUBTRACT)

    # Fillet5
    fillet5_edges = [part.edges().sort_by_distance(p)[0] for p in [
        (-43.73772144, -2075.749926236, -163.840329354),
        (-63.435907554, -2075.749926236, -163.840329354),
    ]]
    fillet(fillet5_edges, radius=FILLET5_R)

    # Sketch23 → Cut-Extrude9 (cut)
    with BuildSketch(Plane(origin=(0, -2095.749926236, 0), x_dir=(1, 0, 0), z_dir=(0, 1, 0))):
        with Locations((-64.807784504, 183.179703141)):
            Rectangle(SKETCH23_W, SKETCH23_H)
        with Locations((-42.365844491, 183.179703141)):
            Rectangle(SKETCH23_W, SKETCH23_H)
    extrude(amount=-CUT_EXTRUDE9_DEPTH, mode=Mode.SUBTRACT)

    # Sketch24 → Boss-Extrude13 (add)
    with BuildSketch(Plane(origin=(0, 0, -189.919076927), x_dir=(-1, 0, 0), z_dir=(0, 0, -1))):
        with Locations((46.516492169, -2106.729513889)):
            Rectangle(SKETCH24_W, SKETCH24_H)
        with Locations((60.806062135, -2106.729513889)):
            Rectangle(SKETCH24_W_2, SKETCH24_H)
    extrude(amount=-BOSS_EXTRUDE13_DEPTH)

    # Fillet6
    fillet6_edges = [part.edges().sort_by_distance(p)[0] for p in [
        (-63.435907554, -2095.749926236, -160.92811232),
        (-63.435907554, -2111.389926236, -183.17970314),
        (-64.807784503, -2111.389926236, -166.163570095),
        (-63.435907554, -2103.569926236, -166.163570095),
        (-64.807784503, -2095.749926236, -166.163570095),
        (-43.73772144, -2095.749926236, -159.898148372),
        (-42.365844491, -2095.749926236, -163.840329354),
        (-43.73772144, -2103.569926236, -163.840329354),
        (-42.365844491, -2111.389926236, -163.840329354),
        (-43.73772144, -2111.389926236, -183.17970314),
        (-66.179661453, -2103.569926236, -166.163570095),
        (-40.993967541, -2103.569926236, -163.840329354),
    ]]
    fillet(fillet6_edges, radius=FILLET6_R)


solid = part.part
